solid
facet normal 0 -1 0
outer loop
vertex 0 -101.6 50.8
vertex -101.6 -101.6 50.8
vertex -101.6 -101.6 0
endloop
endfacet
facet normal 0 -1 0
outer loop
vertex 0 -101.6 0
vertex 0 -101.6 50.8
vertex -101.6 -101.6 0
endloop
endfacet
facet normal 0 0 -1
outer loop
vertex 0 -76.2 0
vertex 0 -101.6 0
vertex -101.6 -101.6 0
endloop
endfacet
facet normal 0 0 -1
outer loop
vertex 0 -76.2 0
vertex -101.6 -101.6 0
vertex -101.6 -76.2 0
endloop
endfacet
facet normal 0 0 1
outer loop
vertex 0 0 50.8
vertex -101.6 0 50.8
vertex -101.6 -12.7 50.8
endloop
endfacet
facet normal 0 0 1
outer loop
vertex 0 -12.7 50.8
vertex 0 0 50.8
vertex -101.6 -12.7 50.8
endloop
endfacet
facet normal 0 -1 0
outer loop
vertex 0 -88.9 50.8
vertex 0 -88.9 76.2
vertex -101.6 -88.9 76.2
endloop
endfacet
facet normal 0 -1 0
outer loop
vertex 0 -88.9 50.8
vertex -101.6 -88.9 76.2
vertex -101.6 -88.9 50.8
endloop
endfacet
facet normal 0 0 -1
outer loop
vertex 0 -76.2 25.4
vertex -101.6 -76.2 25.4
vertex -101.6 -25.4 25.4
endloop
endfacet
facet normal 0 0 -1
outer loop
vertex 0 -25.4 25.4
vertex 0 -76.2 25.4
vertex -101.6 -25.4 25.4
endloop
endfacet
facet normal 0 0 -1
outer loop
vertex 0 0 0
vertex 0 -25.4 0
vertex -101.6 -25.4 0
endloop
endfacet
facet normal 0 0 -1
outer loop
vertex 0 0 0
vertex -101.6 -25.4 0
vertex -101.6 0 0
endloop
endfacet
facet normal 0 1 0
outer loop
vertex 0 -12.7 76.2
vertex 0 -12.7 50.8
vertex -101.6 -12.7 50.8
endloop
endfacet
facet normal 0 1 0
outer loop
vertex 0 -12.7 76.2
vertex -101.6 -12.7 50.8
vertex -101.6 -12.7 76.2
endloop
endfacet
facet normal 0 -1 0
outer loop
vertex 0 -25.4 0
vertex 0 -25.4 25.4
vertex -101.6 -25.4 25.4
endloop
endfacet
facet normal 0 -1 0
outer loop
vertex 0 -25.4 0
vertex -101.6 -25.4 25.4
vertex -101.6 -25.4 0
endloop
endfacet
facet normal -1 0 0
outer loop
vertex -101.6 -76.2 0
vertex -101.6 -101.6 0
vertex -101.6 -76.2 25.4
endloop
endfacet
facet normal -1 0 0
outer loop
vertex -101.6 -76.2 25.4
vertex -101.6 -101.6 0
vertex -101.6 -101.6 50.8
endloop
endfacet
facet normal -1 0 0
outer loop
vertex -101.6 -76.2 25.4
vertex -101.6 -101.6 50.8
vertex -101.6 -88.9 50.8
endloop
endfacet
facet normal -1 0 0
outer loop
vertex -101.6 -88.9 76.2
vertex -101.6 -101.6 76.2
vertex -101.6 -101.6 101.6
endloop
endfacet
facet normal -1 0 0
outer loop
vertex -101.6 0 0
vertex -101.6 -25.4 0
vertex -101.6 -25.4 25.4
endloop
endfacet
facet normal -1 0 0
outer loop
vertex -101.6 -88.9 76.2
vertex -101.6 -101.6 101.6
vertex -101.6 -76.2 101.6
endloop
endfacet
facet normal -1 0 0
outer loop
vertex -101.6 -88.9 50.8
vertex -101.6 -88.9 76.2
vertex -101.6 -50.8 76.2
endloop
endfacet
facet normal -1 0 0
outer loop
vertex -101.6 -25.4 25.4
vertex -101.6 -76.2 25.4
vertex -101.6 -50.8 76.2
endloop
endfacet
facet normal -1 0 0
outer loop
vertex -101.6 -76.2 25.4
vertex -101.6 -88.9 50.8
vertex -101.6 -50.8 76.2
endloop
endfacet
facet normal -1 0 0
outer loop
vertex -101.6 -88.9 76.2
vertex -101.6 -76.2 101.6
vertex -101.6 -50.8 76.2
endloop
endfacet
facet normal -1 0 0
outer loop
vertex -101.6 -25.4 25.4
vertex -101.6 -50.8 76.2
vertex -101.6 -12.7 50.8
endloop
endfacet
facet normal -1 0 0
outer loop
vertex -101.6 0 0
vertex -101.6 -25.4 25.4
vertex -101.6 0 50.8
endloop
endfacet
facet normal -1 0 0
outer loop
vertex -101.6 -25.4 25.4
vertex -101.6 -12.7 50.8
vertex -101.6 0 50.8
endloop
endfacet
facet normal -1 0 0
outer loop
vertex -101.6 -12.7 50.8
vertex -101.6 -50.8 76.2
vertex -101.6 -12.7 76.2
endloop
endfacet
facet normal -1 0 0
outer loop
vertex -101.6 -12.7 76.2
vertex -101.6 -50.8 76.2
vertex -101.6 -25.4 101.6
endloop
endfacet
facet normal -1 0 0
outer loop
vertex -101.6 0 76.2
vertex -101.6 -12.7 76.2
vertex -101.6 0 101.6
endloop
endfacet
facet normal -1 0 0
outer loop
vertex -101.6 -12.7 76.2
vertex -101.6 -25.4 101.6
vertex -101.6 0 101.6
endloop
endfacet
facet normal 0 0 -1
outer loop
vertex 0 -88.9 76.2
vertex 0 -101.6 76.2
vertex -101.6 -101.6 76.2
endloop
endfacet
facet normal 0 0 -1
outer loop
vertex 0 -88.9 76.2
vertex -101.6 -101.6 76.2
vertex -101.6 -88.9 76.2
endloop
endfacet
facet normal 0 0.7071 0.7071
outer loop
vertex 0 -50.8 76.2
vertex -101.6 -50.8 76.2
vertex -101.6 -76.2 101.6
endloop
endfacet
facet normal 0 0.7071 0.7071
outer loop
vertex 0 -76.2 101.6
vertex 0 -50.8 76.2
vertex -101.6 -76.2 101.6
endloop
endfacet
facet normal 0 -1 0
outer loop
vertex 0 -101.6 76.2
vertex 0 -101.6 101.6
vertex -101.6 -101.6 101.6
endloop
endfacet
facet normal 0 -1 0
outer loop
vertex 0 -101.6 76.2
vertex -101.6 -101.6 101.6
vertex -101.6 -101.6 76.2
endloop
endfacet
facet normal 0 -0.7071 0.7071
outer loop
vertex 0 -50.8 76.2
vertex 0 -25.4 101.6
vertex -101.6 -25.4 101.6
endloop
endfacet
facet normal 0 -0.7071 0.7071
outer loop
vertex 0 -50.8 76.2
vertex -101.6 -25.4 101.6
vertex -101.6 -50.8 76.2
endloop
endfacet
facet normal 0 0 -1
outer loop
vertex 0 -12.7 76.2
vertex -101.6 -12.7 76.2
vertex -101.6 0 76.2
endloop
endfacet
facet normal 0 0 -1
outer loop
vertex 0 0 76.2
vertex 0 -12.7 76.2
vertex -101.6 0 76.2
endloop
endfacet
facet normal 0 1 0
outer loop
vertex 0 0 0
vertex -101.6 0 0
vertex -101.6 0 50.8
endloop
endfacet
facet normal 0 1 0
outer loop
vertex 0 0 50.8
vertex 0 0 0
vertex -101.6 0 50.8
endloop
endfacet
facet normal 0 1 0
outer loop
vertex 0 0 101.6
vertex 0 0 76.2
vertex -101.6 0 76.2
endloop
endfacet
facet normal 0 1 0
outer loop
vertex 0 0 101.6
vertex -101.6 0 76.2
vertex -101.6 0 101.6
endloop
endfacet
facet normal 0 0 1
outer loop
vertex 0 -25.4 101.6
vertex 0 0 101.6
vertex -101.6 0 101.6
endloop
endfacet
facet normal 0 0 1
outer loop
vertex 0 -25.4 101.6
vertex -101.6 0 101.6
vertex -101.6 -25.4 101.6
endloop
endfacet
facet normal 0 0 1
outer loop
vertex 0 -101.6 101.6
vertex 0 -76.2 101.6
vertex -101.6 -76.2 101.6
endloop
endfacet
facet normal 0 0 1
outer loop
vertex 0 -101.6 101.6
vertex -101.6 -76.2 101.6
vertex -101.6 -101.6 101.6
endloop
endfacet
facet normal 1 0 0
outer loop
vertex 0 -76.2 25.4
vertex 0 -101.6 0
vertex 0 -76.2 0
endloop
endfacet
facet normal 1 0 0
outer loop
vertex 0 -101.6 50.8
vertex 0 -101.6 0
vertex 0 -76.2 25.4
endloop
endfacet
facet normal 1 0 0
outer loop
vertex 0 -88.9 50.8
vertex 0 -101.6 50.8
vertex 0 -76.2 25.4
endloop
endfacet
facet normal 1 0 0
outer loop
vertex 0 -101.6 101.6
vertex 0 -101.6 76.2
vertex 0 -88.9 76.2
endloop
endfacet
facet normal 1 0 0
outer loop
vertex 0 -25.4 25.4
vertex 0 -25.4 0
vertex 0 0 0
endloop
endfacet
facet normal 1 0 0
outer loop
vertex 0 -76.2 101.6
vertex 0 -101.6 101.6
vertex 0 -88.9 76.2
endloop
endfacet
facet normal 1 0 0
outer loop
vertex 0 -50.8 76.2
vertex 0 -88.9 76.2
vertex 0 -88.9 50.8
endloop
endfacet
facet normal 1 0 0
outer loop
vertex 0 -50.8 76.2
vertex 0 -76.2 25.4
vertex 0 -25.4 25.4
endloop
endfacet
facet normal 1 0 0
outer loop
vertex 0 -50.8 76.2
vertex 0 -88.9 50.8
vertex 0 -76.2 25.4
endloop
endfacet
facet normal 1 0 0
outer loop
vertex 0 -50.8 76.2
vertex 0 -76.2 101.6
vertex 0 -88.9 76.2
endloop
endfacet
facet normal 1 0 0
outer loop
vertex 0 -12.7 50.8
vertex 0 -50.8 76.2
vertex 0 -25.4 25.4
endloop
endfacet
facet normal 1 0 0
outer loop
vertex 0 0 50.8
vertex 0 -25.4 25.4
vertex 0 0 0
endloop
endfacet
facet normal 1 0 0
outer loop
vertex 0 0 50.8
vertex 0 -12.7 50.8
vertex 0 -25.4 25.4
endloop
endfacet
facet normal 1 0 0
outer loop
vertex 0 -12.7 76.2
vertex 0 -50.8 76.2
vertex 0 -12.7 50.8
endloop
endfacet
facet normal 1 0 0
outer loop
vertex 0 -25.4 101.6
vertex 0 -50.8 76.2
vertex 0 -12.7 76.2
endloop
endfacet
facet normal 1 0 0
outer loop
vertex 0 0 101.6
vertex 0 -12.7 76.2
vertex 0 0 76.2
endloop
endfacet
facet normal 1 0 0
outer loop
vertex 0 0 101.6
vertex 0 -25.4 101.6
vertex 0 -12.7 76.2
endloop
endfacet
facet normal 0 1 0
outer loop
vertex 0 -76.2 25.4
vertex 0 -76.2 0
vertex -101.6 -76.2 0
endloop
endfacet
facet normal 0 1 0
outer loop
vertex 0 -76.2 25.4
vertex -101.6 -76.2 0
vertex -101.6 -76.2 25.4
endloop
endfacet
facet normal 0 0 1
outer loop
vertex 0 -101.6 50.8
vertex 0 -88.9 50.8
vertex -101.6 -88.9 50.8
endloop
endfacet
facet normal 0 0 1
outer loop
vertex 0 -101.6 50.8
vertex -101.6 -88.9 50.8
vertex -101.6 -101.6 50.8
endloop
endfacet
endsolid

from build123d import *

# Parameters (mm, degrees)
F1_DEPTH = 101.6


with BuildPart() as f1:
    # F0 (on Right) → F1 (new body)
    with BuildSketch(Plane.YZ):
        Polygon((-25.4, 0), (0, 0), (0, 50.8), (-12.7, 50.8), (-12.7, 76.2), (0, 76.2), (0, 101.6), (-25.4, 101.6), (-50.8, 76.2), (-76.2, 101.6), (-101.6, 101.6), (-101.6, 76.2), (-88.9, 76.2), (-88.9, 50.8), (-101.6, 50.8), (-101.6, 0), (-76.2, 0), (-76.2, 25.4), (-25.4, 25.4), align=None)
    extrude(amount=-F1_DEPTH)


solid = f1.part
